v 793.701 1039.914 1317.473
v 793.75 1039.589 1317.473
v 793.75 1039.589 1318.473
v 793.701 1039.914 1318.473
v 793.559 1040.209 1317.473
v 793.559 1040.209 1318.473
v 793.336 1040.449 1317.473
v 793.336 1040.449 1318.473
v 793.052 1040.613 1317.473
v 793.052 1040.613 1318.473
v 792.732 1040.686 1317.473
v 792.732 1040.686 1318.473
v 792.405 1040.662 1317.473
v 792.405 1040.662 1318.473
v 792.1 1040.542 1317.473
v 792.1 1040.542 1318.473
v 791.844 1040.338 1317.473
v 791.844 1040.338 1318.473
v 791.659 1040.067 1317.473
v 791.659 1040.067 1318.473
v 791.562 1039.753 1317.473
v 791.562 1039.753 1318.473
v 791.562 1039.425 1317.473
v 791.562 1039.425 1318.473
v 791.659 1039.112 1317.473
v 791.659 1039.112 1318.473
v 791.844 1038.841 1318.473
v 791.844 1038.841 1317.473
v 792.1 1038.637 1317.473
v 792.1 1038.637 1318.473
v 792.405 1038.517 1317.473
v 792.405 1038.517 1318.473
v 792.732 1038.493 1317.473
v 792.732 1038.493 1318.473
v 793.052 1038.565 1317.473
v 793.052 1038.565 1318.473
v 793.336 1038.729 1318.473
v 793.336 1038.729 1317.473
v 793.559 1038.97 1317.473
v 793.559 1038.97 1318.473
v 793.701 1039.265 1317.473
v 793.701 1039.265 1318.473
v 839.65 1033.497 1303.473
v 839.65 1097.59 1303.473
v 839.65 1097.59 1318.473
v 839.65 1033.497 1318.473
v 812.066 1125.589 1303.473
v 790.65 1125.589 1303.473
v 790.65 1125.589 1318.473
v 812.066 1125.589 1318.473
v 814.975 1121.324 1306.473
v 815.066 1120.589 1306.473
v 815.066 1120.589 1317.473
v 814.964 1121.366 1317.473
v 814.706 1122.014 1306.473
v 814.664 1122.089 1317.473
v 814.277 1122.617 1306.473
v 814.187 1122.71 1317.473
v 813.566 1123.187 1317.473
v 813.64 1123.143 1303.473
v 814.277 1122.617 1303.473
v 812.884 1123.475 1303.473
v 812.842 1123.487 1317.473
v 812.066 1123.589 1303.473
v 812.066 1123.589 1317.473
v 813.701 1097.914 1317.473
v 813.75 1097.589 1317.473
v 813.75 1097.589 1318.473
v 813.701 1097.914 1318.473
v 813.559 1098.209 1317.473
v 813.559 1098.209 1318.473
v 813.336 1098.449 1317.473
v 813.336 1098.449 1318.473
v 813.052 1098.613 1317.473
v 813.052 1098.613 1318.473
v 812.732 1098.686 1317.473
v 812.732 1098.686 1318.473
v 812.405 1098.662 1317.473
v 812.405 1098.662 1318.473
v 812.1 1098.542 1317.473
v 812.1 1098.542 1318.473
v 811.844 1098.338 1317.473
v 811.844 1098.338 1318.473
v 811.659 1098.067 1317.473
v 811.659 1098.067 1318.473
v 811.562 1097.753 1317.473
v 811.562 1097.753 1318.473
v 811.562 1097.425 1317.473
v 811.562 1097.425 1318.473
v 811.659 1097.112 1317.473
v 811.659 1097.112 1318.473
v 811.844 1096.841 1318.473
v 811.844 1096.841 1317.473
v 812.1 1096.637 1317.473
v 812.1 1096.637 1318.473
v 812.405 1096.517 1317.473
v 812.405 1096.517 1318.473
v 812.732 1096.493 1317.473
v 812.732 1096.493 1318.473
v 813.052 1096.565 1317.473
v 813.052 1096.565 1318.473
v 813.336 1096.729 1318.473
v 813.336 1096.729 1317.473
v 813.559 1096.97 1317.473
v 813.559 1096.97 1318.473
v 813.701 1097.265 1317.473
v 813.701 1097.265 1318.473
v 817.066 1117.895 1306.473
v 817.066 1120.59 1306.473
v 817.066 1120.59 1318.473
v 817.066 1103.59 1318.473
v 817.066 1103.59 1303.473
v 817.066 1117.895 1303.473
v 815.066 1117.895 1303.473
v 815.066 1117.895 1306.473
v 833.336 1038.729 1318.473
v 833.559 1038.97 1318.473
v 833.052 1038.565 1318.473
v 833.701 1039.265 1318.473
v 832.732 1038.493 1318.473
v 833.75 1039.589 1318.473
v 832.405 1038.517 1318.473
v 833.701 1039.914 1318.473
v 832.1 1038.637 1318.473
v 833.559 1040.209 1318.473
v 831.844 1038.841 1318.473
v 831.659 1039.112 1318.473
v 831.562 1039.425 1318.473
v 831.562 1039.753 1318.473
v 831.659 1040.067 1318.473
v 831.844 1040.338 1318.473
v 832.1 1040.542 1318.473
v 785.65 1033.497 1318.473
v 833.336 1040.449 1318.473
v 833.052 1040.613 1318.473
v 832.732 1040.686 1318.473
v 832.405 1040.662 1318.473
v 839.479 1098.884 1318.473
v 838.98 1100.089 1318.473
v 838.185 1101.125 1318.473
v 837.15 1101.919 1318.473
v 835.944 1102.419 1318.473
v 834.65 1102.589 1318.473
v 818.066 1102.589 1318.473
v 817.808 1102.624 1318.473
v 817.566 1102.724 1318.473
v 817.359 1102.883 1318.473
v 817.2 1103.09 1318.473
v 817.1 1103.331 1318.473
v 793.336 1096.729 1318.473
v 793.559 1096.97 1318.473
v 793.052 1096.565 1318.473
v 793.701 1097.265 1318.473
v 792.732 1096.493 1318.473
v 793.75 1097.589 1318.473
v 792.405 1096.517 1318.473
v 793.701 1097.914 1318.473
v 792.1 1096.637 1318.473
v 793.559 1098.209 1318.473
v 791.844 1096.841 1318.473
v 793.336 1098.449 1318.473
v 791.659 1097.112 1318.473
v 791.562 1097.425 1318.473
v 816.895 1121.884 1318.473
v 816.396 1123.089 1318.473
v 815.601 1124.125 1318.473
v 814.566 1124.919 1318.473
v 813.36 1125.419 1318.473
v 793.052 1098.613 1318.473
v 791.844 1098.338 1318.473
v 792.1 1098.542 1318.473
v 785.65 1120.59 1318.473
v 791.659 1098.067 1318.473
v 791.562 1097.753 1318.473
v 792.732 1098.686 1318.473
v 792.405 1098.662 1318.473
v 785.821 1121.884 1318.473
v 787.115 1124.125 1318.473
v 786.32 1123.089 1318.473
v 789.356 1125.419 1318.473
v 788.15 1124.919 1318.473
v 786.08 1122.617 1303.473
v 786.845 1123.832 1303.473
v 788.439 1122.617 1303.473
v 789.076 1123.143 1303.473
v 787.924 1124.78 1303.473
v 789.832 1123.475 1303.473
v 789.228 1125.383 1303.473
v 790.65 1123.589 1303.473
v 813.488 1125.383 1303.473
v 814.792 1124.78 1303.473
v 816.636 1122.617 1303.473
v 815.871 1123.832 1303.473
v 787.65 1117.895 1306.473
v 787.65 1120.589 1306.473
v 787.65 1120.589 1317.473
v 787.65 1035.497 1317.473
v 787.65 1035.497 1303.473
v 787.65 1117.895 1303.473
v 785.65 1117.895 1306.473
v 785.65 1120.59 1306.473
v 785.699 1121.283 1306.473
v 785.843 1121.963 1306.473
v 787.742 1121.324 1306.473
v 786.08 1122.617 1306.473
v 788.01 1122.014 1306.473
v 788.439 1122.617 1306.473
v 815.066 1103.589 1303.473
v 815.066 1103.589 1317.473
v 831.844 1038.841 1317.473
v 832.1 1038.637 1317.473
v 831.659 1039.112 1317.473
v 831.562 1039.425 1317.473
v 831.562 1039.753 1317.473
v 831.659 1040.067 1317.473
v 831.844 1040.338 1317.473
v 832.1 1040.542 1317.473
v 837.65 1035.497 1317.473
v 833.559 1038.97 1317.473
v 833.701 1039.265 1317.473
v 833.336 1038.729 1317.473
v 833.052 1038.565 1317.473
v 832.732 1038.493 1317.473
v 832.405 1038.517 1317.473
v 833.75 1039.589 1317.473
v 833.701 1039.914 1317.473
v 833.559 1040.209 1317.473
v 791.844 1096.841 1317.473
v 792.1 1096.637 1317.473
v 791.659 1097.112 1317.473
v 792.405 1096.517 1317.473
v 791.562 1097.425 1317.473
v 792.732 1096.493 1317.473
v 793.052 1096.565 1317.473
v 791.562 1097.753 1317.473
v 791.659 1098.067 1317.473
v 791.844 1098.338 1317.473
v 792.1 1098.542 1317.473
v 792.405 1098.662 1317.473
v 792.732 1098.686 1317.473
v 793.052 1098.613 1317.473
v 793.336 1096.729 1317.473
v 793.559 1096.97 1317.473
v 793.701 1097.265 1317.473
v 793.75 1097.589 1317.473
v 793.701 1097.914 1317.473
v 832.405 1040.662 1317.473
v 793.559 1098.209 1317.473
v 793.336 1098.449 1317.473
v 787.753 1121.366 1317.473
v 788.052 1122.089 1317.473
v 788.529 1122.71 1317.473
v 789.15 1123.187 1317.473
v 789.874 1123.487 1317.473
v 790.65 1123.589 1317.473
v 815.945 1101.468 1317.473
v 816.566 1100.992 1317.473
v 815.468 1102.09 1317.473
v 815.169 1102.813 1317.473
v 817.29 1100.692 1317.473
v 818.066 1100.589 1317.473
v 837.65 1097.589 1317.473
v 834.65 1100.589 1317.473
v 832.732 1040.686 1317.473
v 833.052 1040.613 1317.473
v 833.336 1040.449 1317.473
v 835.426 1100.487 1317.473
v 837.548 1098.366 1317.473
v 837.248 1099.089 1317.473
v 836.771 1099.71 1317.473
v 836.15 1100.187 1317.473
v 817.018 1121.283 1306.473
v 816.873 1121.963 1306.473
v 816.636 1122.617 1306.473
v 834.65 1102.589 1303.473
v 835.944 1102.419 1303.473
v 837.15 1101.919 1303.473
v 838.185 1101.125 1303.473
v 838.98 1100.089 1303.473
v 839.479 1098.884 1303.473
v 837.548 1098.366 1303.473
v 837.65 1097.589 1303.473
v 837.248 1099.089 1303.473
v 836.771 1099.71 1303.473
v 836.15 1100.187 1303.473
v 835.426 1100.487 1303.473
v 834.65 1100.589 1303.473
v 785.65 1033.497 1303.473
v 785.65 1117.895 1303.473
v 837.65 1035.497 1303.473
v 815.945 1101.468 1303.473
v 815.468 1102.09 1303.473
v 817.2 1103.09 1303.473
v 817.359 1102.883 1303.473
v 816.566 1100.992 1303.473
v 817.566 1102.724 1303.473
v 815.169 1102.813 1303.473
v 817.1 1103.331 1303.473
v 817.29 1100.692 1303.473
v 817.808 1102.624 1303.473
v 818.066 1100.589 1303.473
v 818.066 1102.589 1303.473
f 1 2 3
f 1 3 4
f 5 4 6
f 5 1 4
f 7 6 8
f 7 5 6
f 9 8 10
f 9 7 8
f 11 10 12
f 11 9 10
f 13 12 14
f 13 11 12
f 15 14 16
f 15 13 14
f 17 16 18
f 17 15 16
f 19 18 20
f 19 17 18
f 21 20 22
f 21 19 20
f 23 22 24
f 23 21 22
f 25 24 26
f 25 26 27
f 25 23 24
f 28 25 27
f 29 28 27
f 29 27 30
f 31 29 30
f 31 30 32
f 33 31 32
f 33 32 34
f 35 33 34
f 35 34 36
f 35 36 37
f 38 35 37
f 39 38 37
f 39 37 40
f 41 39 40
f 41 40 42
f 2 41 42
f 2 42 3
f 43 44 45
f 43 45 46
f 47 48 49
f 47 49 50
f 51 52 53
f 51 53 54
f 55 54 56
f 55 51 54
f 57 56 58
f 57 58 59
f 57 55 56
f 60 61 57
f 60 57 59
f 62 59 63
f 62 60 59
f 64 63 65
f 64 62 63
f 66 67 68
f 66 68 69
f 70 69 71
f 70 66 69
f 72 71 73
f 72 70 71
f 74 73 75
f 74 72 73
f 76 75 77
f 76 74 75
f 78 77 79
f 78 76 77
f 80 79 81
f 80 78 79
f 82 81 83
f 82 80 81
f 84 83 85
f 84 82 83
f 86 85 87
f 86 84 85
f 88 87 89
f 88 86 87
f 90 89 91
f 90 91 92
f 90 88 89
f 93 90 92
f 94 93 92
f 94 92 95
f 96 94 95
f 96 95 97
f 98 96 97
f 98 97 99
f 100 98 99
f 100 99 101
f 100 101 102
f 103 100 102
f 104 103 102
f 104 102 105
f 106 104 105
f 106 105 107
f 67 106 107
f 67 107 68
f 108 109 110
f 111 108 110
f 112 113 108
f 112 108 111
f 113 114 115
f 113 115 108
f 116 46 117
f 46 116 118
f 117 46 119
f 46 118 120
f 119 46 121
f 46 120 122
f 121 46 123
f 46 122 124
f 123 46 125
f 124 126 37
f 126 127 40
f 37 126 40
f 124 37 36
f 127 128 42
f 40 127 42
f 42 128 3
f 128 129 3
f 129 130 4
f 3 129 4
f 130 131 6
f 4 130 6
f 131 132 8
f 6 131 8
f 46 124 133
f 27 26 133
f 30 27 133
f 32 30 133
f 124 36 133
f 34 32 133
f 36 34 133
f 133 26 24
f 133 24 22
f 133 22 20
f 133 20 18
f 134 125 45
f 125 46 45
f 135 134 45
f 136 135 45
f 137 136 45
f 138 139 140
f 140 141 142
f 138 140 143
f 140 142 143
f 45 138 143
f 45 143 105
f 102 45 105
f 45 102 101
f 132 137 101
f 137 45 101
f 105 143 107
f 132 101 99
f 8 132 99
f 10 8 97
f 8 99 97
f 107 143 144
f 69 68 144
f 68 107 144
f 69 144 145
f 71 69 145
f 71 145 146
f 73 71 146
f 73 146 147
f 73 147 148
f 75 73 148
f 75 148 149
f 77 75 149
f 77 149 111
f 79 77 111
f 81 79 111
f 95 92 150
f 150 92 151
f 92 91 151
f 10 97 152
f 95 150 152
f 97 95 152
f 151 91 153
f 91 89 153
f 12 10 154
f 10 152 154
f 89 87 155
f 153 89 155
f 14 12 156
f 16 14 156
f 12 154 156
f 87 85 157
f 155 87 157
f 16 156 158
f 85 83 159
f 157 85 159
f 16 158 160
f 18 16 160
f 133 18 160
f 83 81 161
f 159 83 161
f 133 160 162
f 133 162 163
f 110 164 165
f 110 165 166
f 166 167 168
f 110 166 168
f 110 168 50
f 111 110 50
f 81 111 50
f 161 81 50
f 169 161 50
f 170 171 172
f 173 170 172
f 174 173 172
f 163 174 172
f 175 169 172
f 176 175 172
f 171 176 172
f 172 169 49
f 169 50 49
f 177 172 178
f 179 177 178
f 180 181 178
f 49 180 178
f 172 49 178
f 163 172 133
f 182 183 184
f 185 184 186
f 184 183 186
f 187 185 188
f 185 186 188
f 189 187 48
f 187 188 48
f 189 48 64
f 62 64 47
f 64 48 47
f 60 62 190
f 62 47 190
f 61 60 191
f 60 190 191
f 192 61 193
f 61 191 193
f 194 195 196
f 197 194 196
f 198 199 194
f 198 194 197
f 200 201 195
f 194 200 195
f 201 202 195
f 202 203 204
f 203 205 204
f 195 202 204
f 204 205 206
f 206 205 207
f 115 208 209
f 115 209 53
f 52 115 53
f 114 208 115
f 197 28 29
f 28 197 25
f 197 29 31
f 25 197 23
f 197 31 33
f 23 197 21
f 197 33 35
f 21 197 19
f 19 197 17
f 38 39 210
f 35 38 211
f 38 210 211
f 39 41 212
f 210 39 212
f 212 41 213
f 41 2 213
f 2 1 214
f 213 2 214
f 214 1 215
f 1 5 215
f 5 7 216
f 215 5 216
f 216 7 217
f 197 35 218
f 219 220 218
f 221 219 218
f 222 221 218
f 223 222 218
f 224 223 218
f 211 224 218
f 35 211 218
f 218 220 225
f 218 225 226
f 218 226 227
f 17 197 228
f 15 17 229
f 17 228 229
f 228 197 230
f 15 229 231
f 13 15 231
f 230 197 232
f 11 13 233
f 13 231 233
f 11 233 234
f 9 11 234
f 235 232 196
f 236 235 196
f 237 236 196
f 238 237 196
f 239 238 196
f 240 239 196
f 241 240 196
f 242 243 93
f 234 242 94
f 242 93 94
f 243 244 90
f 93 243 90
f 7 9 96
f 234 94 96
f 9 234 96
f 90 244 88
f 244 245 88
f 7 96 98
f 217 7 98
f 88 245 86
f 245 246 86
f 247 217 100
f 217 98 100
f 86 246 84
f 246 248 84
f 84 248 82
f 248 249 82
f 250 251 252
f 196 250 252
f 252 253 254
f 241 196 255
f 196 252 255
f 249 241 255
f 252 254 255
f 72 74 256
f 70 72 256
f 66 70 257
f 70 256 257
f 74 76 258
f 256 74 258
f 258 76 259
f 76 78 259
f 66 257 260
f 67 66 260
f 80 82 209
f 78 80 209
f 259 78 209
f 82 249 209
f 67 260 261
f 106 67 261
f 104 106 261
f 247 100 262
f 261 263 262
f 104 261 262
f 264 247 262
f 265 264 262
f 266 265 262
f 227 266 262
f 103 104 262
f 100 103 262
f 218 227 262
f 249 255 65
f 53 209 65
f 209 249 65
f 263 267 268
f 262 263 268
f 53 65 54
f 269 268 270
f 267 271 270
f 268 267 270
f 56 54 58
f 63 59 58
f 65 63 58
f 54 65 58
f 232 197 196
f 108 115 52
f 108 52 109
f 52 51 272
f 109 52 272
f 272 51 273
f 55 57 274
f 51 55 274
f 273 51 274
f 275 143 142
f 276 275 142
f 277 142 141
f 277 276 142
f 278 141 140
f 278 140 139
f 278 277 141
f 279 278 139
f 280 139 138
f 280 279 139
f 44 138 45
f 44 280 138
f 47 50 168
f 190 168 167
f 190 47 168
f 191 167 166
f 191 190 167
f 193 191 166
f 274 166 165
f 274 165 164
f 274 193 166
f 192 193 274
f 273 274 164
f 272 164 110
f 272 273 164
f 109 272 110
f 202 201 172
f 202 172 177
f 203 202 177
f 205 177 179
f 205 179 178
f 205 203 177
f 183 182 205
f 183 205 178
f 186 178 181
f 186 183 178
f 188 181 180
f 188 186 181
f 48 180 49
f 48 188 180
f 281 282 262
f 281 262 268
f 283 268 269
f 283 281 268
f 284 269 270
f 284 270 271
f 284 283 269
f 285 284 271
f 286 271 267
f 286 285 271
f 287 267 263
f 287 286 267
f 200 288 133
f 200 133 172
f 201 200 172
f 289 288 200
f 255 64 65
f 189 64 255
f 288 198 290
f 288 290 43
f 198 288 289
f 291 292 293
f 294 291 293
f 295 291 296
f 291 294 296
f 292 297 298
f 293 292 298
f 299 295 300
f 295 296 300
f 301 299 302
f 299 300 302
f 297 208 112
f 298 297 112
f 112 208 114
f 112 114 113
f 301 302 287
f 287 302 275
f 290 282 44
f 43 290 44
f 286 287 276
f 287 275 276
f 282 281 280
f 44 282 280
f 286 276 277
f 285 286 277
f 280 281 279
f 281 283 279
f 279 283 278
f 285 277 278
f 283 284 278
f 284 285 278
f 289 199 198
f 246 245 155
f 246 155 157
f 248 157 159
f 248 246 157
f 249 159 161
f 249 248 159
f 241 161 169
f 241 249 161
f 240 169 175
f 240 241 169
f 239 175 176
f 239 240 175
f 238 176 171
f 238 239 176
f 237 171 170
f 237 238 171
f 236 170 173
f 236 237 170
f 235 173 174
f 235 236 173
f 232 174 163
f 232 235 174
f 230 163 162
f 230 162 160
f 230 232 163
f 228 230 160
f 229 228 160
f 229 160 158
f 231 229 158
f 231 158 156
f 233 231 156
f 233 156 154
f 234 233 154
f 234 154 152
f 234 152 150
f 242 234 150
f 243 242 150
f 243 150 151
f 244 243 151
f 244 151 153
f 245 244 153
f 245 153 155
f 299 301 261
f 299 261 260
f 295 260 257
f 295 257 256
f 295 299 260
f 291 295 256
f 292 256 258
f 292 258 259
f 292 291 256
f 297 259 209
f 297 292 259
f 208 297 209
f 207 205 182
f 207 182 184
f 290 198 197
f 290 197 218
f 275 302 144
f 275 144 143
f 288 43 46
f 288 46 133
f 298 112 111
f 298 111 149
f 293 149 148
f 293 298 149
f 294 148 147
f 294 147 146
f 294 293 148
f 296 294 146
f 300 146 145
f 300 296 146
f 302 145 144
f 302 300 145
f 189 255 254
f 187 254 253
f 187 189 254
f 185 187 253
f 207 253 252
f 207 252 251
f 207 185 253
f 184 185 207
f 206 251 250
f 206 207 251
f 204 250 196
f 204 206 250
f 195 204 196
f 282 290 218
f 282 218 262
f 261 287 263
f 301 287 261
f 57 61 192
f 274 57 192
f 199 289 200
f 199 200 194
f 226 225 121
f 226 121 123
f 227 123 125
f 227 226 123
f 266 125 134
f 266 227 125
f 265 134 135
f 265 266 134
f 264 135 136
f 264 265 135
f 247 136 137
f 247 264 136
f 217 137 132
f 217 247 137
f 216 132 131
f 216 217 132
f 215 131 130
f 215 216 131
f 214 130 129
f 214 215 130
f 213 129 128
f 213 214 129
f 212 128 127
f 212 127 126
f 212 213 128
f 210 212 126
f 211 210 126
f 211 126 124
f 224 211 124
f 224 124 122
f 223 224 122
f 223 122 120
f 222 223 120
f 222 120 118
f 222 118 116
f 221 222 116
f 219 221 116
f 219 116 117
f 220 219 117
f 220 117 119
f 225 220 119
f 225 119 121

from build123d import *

# Parameters (mm, degrees)
BOSS_EXTRUDE1_DEPTH = 15
BOSS_EXTRUDE2_DEPTH = 15
CUT_EXTRUDE1_DEPTH  = 14
SKETCH8_W           = 6.699223296
SKETCH8_H           = 4.721357371
SKETCH8_W_2         = 8.228893272
CUT_EXTRUDE7_DEPTH  = 3
SKETCH10_R          = 1.1
CUT_EXTRUDE9_DEPTH  = 15


with BuildPart() as part:
    # Sketch3 → Boss-Extrude1 (new body)
    with BuildSketch(Plane.XY.offset(1303.472903018)):
        with BuildLine():
            Line((839.650097305, 1097.589789038), (839.650097371, 1033.49652121))
            Line((839.650097371, 1033.49652121), (785.650097371, 1033.49652121))
            Line((785.650097371, 1033.49652121), (785.650097438, 1120.589789038))
            ThreePointArc((785.650097438, 1120.589789038), (787.114883847, 1124.124637961), (790.64973277, 1125.58942437))
            Line((790.64973277, 1125.58942437), (812.066461973, 1125.58942437))
            ThreePointArc((812.066461973, 1125.58942437), (815.601310896, 1124.124637961), (817.066097305, 1120.589789038))
            Line((817.066097305, 1120.589789038), (817.066097305, 1103.589789038))
            ThreePointArc((817.066097305, 1103.589789038), (817.35931084, 1102.882637905), (818.066461973, 1102.58942437))
            Line((818.066461973, 1102.58942437), (834.650461973, 1102.58942437))
            ThreePointArc((834.650461973, 1102.58942437), (838.185310896, 1101.124637961), (839.650097305, 1097.589789038))
        make_face()
        with BuildLine():
            Line((787.650097371, 1035.49652121), (787.650097371, 1120.589424436))
            ThreePointArc((787.650097371, 1120.589424436), (788.529097371, 1122.710424436), (790.650097371, 1123.589424436))
            Line((790.650097371, 1123.589424436), (812.066097371, 1123.589424436))
            ThreePointArc((812.066097371, 1123.589424436), (814.187097371, 1122.710424436), (815.066097371, 1120.589424436))
            Line((815.066097371, 1120.589424436), (815.066097371, 1103.589424436))
            ThreePointArc((815.066097371, 1103.589424436), (815.945097371, 1101.468424436), (818.066097371, 1100.589424436))
            Line((818.066097371, 1100.589424436), (834.650097371, 1100.589424436))
            ThreePointArc((834.650097371, 1100.589424436), (836.771097371, 1099.710424436), (837.650097371, 1097.589424436))
            Line((837.650097371, 1097.589424436), (837.650097371, 1035.49652121))
            Line((837.650097371, 1035.49652121), (787.650097371, 1035.49652121))
        make_face(mode=Mode.SUBTRACT)
    extrude(amount=BOSS_EXTRUDE1_DEPTH)

    # Sketch6 → Boss-Extrude2 (add)
    with BuildSketch(Plane.XY.offset(1303.472903018)):
        with BuildLine():
            Line((787.650097371, 1035.49652121), (837.650097371, 1035.49652121))
            Line((837.650097371, 1035.49652121), (837.650097371, 1097.589424436))
            ThreePointArc((837.650097371, 1097.589424436), (836.771097371, 1099.710424436), (834.650097371, 1100.589424436))
            Line((834.650097371, 1100.589424436), (818.066097371, 1100.589424436))
            ThreePointArc((818.066097371, 1100.589424436), (815.945097371, 1101.468424436), (815.066097371, 1103.589424436))
            Line((815.066097371, 1103.589424436), (815.066097371, 1120.589424436))
            ThreePointArc((815.066097371, 1120.589424436), (814.187097371, 1122.710424436), (812.066097371, 1123.589424436))
            Line((812.066097371, 1123.589424436), (790.650097371, 1123.589424436))
            ThreePointArc((790.650097371, 1123.589424436), (788.529097371, 1122.710424436), (787.650097371, 1120.589424436))
            Line((787.650097371, 1120.589424436), (787.650097371, 1035.49652121))
        make_face()
    extrude(amount=BOSS_EXTRUDE2_DEPTH)

    # Sketch6<2> → Cut-Extrude1 (cut)
    with BuildSketch(Plane.XY.offset(1303.472903018)):
        with BuildLine():
            Line((787.650097371, 1035.49652121), (837.650097371, 1035.49652121))
            Line((837.650097371, 1035.49652121), (837.650097371, 1097.589424436))
            ThreePointArc((837.650097371, 1097.589424436), (836.771097371, 1099.710424436), (834.650097371, 1100.589424436))
            Line((834.650097371, 1100.589424436), (818.066097371, 1100.589424436))
            ThreePointArc((818.066097371, 1100.589424436), (815.945097371, 1101.468424436), (815.066097371, 1103.589424436))
            Line((815.066097371, 1103.589424436), (815.066097371, 1120.589424436))
            ThreePointArc((815.066097371, 1120.589424436), (814.187097371, 1122.710424436), (812.066097371, 1123.589424436))
            Line((812.066097371, 1123.589424436), (790.650097371, 1123.589424436))
            ThreePointArc((790.650097371, 1123.589424436), (788.529097371, 1122.710424436), (787.650097371, 1120.589424436))
            Line((787.650097371, 1120.589424436), (787.650097371, 1035.49652121))
        make_face()
    extrude(amount=CUT_EXTRUDE1_DEPTH, mode=Mode.SUBTRACT)

    # Sketch8 → Cut-Extrude7 (cut)
    with BuildSketch(Plane.XY.offset(1303.472903018)):
        with Locations((788.177093813, 1120.255926572)):
            Rectangle(SKETCH8_W, SKETCH8_H)
        with Locations((813.958809837, 1120.255926572)):
            Rectangle(SKETCH8_W_2, SKETCH8_H)
    extrude(amount=CUT_EXTRUDE7_DEPTH, mode=Mode.SUBTRACT)

    # Sketch10 → Cut-Extrude9 (cut)
    with BuildSketch(Plane.XY.offset(1303.472903018)):
        with Locations((832.650097371, 1039.589424436)):
            Circle(SKETCH10_R)
        with Locations((792.650097371, 1039.589424436)):
            Circle(SKETCH10_R)
        with Locations((792.650097371, 1097.589424436)):
            Circle(SKETCH10_R)
        with Locations((812.650097371, 1097.589424436)):
            Circle(SKETCH10_R)
    extrude(amount=CUT_EXTRUDE9_DEPTH, mode=Mode.SUBTRACT)


solid = part.part
